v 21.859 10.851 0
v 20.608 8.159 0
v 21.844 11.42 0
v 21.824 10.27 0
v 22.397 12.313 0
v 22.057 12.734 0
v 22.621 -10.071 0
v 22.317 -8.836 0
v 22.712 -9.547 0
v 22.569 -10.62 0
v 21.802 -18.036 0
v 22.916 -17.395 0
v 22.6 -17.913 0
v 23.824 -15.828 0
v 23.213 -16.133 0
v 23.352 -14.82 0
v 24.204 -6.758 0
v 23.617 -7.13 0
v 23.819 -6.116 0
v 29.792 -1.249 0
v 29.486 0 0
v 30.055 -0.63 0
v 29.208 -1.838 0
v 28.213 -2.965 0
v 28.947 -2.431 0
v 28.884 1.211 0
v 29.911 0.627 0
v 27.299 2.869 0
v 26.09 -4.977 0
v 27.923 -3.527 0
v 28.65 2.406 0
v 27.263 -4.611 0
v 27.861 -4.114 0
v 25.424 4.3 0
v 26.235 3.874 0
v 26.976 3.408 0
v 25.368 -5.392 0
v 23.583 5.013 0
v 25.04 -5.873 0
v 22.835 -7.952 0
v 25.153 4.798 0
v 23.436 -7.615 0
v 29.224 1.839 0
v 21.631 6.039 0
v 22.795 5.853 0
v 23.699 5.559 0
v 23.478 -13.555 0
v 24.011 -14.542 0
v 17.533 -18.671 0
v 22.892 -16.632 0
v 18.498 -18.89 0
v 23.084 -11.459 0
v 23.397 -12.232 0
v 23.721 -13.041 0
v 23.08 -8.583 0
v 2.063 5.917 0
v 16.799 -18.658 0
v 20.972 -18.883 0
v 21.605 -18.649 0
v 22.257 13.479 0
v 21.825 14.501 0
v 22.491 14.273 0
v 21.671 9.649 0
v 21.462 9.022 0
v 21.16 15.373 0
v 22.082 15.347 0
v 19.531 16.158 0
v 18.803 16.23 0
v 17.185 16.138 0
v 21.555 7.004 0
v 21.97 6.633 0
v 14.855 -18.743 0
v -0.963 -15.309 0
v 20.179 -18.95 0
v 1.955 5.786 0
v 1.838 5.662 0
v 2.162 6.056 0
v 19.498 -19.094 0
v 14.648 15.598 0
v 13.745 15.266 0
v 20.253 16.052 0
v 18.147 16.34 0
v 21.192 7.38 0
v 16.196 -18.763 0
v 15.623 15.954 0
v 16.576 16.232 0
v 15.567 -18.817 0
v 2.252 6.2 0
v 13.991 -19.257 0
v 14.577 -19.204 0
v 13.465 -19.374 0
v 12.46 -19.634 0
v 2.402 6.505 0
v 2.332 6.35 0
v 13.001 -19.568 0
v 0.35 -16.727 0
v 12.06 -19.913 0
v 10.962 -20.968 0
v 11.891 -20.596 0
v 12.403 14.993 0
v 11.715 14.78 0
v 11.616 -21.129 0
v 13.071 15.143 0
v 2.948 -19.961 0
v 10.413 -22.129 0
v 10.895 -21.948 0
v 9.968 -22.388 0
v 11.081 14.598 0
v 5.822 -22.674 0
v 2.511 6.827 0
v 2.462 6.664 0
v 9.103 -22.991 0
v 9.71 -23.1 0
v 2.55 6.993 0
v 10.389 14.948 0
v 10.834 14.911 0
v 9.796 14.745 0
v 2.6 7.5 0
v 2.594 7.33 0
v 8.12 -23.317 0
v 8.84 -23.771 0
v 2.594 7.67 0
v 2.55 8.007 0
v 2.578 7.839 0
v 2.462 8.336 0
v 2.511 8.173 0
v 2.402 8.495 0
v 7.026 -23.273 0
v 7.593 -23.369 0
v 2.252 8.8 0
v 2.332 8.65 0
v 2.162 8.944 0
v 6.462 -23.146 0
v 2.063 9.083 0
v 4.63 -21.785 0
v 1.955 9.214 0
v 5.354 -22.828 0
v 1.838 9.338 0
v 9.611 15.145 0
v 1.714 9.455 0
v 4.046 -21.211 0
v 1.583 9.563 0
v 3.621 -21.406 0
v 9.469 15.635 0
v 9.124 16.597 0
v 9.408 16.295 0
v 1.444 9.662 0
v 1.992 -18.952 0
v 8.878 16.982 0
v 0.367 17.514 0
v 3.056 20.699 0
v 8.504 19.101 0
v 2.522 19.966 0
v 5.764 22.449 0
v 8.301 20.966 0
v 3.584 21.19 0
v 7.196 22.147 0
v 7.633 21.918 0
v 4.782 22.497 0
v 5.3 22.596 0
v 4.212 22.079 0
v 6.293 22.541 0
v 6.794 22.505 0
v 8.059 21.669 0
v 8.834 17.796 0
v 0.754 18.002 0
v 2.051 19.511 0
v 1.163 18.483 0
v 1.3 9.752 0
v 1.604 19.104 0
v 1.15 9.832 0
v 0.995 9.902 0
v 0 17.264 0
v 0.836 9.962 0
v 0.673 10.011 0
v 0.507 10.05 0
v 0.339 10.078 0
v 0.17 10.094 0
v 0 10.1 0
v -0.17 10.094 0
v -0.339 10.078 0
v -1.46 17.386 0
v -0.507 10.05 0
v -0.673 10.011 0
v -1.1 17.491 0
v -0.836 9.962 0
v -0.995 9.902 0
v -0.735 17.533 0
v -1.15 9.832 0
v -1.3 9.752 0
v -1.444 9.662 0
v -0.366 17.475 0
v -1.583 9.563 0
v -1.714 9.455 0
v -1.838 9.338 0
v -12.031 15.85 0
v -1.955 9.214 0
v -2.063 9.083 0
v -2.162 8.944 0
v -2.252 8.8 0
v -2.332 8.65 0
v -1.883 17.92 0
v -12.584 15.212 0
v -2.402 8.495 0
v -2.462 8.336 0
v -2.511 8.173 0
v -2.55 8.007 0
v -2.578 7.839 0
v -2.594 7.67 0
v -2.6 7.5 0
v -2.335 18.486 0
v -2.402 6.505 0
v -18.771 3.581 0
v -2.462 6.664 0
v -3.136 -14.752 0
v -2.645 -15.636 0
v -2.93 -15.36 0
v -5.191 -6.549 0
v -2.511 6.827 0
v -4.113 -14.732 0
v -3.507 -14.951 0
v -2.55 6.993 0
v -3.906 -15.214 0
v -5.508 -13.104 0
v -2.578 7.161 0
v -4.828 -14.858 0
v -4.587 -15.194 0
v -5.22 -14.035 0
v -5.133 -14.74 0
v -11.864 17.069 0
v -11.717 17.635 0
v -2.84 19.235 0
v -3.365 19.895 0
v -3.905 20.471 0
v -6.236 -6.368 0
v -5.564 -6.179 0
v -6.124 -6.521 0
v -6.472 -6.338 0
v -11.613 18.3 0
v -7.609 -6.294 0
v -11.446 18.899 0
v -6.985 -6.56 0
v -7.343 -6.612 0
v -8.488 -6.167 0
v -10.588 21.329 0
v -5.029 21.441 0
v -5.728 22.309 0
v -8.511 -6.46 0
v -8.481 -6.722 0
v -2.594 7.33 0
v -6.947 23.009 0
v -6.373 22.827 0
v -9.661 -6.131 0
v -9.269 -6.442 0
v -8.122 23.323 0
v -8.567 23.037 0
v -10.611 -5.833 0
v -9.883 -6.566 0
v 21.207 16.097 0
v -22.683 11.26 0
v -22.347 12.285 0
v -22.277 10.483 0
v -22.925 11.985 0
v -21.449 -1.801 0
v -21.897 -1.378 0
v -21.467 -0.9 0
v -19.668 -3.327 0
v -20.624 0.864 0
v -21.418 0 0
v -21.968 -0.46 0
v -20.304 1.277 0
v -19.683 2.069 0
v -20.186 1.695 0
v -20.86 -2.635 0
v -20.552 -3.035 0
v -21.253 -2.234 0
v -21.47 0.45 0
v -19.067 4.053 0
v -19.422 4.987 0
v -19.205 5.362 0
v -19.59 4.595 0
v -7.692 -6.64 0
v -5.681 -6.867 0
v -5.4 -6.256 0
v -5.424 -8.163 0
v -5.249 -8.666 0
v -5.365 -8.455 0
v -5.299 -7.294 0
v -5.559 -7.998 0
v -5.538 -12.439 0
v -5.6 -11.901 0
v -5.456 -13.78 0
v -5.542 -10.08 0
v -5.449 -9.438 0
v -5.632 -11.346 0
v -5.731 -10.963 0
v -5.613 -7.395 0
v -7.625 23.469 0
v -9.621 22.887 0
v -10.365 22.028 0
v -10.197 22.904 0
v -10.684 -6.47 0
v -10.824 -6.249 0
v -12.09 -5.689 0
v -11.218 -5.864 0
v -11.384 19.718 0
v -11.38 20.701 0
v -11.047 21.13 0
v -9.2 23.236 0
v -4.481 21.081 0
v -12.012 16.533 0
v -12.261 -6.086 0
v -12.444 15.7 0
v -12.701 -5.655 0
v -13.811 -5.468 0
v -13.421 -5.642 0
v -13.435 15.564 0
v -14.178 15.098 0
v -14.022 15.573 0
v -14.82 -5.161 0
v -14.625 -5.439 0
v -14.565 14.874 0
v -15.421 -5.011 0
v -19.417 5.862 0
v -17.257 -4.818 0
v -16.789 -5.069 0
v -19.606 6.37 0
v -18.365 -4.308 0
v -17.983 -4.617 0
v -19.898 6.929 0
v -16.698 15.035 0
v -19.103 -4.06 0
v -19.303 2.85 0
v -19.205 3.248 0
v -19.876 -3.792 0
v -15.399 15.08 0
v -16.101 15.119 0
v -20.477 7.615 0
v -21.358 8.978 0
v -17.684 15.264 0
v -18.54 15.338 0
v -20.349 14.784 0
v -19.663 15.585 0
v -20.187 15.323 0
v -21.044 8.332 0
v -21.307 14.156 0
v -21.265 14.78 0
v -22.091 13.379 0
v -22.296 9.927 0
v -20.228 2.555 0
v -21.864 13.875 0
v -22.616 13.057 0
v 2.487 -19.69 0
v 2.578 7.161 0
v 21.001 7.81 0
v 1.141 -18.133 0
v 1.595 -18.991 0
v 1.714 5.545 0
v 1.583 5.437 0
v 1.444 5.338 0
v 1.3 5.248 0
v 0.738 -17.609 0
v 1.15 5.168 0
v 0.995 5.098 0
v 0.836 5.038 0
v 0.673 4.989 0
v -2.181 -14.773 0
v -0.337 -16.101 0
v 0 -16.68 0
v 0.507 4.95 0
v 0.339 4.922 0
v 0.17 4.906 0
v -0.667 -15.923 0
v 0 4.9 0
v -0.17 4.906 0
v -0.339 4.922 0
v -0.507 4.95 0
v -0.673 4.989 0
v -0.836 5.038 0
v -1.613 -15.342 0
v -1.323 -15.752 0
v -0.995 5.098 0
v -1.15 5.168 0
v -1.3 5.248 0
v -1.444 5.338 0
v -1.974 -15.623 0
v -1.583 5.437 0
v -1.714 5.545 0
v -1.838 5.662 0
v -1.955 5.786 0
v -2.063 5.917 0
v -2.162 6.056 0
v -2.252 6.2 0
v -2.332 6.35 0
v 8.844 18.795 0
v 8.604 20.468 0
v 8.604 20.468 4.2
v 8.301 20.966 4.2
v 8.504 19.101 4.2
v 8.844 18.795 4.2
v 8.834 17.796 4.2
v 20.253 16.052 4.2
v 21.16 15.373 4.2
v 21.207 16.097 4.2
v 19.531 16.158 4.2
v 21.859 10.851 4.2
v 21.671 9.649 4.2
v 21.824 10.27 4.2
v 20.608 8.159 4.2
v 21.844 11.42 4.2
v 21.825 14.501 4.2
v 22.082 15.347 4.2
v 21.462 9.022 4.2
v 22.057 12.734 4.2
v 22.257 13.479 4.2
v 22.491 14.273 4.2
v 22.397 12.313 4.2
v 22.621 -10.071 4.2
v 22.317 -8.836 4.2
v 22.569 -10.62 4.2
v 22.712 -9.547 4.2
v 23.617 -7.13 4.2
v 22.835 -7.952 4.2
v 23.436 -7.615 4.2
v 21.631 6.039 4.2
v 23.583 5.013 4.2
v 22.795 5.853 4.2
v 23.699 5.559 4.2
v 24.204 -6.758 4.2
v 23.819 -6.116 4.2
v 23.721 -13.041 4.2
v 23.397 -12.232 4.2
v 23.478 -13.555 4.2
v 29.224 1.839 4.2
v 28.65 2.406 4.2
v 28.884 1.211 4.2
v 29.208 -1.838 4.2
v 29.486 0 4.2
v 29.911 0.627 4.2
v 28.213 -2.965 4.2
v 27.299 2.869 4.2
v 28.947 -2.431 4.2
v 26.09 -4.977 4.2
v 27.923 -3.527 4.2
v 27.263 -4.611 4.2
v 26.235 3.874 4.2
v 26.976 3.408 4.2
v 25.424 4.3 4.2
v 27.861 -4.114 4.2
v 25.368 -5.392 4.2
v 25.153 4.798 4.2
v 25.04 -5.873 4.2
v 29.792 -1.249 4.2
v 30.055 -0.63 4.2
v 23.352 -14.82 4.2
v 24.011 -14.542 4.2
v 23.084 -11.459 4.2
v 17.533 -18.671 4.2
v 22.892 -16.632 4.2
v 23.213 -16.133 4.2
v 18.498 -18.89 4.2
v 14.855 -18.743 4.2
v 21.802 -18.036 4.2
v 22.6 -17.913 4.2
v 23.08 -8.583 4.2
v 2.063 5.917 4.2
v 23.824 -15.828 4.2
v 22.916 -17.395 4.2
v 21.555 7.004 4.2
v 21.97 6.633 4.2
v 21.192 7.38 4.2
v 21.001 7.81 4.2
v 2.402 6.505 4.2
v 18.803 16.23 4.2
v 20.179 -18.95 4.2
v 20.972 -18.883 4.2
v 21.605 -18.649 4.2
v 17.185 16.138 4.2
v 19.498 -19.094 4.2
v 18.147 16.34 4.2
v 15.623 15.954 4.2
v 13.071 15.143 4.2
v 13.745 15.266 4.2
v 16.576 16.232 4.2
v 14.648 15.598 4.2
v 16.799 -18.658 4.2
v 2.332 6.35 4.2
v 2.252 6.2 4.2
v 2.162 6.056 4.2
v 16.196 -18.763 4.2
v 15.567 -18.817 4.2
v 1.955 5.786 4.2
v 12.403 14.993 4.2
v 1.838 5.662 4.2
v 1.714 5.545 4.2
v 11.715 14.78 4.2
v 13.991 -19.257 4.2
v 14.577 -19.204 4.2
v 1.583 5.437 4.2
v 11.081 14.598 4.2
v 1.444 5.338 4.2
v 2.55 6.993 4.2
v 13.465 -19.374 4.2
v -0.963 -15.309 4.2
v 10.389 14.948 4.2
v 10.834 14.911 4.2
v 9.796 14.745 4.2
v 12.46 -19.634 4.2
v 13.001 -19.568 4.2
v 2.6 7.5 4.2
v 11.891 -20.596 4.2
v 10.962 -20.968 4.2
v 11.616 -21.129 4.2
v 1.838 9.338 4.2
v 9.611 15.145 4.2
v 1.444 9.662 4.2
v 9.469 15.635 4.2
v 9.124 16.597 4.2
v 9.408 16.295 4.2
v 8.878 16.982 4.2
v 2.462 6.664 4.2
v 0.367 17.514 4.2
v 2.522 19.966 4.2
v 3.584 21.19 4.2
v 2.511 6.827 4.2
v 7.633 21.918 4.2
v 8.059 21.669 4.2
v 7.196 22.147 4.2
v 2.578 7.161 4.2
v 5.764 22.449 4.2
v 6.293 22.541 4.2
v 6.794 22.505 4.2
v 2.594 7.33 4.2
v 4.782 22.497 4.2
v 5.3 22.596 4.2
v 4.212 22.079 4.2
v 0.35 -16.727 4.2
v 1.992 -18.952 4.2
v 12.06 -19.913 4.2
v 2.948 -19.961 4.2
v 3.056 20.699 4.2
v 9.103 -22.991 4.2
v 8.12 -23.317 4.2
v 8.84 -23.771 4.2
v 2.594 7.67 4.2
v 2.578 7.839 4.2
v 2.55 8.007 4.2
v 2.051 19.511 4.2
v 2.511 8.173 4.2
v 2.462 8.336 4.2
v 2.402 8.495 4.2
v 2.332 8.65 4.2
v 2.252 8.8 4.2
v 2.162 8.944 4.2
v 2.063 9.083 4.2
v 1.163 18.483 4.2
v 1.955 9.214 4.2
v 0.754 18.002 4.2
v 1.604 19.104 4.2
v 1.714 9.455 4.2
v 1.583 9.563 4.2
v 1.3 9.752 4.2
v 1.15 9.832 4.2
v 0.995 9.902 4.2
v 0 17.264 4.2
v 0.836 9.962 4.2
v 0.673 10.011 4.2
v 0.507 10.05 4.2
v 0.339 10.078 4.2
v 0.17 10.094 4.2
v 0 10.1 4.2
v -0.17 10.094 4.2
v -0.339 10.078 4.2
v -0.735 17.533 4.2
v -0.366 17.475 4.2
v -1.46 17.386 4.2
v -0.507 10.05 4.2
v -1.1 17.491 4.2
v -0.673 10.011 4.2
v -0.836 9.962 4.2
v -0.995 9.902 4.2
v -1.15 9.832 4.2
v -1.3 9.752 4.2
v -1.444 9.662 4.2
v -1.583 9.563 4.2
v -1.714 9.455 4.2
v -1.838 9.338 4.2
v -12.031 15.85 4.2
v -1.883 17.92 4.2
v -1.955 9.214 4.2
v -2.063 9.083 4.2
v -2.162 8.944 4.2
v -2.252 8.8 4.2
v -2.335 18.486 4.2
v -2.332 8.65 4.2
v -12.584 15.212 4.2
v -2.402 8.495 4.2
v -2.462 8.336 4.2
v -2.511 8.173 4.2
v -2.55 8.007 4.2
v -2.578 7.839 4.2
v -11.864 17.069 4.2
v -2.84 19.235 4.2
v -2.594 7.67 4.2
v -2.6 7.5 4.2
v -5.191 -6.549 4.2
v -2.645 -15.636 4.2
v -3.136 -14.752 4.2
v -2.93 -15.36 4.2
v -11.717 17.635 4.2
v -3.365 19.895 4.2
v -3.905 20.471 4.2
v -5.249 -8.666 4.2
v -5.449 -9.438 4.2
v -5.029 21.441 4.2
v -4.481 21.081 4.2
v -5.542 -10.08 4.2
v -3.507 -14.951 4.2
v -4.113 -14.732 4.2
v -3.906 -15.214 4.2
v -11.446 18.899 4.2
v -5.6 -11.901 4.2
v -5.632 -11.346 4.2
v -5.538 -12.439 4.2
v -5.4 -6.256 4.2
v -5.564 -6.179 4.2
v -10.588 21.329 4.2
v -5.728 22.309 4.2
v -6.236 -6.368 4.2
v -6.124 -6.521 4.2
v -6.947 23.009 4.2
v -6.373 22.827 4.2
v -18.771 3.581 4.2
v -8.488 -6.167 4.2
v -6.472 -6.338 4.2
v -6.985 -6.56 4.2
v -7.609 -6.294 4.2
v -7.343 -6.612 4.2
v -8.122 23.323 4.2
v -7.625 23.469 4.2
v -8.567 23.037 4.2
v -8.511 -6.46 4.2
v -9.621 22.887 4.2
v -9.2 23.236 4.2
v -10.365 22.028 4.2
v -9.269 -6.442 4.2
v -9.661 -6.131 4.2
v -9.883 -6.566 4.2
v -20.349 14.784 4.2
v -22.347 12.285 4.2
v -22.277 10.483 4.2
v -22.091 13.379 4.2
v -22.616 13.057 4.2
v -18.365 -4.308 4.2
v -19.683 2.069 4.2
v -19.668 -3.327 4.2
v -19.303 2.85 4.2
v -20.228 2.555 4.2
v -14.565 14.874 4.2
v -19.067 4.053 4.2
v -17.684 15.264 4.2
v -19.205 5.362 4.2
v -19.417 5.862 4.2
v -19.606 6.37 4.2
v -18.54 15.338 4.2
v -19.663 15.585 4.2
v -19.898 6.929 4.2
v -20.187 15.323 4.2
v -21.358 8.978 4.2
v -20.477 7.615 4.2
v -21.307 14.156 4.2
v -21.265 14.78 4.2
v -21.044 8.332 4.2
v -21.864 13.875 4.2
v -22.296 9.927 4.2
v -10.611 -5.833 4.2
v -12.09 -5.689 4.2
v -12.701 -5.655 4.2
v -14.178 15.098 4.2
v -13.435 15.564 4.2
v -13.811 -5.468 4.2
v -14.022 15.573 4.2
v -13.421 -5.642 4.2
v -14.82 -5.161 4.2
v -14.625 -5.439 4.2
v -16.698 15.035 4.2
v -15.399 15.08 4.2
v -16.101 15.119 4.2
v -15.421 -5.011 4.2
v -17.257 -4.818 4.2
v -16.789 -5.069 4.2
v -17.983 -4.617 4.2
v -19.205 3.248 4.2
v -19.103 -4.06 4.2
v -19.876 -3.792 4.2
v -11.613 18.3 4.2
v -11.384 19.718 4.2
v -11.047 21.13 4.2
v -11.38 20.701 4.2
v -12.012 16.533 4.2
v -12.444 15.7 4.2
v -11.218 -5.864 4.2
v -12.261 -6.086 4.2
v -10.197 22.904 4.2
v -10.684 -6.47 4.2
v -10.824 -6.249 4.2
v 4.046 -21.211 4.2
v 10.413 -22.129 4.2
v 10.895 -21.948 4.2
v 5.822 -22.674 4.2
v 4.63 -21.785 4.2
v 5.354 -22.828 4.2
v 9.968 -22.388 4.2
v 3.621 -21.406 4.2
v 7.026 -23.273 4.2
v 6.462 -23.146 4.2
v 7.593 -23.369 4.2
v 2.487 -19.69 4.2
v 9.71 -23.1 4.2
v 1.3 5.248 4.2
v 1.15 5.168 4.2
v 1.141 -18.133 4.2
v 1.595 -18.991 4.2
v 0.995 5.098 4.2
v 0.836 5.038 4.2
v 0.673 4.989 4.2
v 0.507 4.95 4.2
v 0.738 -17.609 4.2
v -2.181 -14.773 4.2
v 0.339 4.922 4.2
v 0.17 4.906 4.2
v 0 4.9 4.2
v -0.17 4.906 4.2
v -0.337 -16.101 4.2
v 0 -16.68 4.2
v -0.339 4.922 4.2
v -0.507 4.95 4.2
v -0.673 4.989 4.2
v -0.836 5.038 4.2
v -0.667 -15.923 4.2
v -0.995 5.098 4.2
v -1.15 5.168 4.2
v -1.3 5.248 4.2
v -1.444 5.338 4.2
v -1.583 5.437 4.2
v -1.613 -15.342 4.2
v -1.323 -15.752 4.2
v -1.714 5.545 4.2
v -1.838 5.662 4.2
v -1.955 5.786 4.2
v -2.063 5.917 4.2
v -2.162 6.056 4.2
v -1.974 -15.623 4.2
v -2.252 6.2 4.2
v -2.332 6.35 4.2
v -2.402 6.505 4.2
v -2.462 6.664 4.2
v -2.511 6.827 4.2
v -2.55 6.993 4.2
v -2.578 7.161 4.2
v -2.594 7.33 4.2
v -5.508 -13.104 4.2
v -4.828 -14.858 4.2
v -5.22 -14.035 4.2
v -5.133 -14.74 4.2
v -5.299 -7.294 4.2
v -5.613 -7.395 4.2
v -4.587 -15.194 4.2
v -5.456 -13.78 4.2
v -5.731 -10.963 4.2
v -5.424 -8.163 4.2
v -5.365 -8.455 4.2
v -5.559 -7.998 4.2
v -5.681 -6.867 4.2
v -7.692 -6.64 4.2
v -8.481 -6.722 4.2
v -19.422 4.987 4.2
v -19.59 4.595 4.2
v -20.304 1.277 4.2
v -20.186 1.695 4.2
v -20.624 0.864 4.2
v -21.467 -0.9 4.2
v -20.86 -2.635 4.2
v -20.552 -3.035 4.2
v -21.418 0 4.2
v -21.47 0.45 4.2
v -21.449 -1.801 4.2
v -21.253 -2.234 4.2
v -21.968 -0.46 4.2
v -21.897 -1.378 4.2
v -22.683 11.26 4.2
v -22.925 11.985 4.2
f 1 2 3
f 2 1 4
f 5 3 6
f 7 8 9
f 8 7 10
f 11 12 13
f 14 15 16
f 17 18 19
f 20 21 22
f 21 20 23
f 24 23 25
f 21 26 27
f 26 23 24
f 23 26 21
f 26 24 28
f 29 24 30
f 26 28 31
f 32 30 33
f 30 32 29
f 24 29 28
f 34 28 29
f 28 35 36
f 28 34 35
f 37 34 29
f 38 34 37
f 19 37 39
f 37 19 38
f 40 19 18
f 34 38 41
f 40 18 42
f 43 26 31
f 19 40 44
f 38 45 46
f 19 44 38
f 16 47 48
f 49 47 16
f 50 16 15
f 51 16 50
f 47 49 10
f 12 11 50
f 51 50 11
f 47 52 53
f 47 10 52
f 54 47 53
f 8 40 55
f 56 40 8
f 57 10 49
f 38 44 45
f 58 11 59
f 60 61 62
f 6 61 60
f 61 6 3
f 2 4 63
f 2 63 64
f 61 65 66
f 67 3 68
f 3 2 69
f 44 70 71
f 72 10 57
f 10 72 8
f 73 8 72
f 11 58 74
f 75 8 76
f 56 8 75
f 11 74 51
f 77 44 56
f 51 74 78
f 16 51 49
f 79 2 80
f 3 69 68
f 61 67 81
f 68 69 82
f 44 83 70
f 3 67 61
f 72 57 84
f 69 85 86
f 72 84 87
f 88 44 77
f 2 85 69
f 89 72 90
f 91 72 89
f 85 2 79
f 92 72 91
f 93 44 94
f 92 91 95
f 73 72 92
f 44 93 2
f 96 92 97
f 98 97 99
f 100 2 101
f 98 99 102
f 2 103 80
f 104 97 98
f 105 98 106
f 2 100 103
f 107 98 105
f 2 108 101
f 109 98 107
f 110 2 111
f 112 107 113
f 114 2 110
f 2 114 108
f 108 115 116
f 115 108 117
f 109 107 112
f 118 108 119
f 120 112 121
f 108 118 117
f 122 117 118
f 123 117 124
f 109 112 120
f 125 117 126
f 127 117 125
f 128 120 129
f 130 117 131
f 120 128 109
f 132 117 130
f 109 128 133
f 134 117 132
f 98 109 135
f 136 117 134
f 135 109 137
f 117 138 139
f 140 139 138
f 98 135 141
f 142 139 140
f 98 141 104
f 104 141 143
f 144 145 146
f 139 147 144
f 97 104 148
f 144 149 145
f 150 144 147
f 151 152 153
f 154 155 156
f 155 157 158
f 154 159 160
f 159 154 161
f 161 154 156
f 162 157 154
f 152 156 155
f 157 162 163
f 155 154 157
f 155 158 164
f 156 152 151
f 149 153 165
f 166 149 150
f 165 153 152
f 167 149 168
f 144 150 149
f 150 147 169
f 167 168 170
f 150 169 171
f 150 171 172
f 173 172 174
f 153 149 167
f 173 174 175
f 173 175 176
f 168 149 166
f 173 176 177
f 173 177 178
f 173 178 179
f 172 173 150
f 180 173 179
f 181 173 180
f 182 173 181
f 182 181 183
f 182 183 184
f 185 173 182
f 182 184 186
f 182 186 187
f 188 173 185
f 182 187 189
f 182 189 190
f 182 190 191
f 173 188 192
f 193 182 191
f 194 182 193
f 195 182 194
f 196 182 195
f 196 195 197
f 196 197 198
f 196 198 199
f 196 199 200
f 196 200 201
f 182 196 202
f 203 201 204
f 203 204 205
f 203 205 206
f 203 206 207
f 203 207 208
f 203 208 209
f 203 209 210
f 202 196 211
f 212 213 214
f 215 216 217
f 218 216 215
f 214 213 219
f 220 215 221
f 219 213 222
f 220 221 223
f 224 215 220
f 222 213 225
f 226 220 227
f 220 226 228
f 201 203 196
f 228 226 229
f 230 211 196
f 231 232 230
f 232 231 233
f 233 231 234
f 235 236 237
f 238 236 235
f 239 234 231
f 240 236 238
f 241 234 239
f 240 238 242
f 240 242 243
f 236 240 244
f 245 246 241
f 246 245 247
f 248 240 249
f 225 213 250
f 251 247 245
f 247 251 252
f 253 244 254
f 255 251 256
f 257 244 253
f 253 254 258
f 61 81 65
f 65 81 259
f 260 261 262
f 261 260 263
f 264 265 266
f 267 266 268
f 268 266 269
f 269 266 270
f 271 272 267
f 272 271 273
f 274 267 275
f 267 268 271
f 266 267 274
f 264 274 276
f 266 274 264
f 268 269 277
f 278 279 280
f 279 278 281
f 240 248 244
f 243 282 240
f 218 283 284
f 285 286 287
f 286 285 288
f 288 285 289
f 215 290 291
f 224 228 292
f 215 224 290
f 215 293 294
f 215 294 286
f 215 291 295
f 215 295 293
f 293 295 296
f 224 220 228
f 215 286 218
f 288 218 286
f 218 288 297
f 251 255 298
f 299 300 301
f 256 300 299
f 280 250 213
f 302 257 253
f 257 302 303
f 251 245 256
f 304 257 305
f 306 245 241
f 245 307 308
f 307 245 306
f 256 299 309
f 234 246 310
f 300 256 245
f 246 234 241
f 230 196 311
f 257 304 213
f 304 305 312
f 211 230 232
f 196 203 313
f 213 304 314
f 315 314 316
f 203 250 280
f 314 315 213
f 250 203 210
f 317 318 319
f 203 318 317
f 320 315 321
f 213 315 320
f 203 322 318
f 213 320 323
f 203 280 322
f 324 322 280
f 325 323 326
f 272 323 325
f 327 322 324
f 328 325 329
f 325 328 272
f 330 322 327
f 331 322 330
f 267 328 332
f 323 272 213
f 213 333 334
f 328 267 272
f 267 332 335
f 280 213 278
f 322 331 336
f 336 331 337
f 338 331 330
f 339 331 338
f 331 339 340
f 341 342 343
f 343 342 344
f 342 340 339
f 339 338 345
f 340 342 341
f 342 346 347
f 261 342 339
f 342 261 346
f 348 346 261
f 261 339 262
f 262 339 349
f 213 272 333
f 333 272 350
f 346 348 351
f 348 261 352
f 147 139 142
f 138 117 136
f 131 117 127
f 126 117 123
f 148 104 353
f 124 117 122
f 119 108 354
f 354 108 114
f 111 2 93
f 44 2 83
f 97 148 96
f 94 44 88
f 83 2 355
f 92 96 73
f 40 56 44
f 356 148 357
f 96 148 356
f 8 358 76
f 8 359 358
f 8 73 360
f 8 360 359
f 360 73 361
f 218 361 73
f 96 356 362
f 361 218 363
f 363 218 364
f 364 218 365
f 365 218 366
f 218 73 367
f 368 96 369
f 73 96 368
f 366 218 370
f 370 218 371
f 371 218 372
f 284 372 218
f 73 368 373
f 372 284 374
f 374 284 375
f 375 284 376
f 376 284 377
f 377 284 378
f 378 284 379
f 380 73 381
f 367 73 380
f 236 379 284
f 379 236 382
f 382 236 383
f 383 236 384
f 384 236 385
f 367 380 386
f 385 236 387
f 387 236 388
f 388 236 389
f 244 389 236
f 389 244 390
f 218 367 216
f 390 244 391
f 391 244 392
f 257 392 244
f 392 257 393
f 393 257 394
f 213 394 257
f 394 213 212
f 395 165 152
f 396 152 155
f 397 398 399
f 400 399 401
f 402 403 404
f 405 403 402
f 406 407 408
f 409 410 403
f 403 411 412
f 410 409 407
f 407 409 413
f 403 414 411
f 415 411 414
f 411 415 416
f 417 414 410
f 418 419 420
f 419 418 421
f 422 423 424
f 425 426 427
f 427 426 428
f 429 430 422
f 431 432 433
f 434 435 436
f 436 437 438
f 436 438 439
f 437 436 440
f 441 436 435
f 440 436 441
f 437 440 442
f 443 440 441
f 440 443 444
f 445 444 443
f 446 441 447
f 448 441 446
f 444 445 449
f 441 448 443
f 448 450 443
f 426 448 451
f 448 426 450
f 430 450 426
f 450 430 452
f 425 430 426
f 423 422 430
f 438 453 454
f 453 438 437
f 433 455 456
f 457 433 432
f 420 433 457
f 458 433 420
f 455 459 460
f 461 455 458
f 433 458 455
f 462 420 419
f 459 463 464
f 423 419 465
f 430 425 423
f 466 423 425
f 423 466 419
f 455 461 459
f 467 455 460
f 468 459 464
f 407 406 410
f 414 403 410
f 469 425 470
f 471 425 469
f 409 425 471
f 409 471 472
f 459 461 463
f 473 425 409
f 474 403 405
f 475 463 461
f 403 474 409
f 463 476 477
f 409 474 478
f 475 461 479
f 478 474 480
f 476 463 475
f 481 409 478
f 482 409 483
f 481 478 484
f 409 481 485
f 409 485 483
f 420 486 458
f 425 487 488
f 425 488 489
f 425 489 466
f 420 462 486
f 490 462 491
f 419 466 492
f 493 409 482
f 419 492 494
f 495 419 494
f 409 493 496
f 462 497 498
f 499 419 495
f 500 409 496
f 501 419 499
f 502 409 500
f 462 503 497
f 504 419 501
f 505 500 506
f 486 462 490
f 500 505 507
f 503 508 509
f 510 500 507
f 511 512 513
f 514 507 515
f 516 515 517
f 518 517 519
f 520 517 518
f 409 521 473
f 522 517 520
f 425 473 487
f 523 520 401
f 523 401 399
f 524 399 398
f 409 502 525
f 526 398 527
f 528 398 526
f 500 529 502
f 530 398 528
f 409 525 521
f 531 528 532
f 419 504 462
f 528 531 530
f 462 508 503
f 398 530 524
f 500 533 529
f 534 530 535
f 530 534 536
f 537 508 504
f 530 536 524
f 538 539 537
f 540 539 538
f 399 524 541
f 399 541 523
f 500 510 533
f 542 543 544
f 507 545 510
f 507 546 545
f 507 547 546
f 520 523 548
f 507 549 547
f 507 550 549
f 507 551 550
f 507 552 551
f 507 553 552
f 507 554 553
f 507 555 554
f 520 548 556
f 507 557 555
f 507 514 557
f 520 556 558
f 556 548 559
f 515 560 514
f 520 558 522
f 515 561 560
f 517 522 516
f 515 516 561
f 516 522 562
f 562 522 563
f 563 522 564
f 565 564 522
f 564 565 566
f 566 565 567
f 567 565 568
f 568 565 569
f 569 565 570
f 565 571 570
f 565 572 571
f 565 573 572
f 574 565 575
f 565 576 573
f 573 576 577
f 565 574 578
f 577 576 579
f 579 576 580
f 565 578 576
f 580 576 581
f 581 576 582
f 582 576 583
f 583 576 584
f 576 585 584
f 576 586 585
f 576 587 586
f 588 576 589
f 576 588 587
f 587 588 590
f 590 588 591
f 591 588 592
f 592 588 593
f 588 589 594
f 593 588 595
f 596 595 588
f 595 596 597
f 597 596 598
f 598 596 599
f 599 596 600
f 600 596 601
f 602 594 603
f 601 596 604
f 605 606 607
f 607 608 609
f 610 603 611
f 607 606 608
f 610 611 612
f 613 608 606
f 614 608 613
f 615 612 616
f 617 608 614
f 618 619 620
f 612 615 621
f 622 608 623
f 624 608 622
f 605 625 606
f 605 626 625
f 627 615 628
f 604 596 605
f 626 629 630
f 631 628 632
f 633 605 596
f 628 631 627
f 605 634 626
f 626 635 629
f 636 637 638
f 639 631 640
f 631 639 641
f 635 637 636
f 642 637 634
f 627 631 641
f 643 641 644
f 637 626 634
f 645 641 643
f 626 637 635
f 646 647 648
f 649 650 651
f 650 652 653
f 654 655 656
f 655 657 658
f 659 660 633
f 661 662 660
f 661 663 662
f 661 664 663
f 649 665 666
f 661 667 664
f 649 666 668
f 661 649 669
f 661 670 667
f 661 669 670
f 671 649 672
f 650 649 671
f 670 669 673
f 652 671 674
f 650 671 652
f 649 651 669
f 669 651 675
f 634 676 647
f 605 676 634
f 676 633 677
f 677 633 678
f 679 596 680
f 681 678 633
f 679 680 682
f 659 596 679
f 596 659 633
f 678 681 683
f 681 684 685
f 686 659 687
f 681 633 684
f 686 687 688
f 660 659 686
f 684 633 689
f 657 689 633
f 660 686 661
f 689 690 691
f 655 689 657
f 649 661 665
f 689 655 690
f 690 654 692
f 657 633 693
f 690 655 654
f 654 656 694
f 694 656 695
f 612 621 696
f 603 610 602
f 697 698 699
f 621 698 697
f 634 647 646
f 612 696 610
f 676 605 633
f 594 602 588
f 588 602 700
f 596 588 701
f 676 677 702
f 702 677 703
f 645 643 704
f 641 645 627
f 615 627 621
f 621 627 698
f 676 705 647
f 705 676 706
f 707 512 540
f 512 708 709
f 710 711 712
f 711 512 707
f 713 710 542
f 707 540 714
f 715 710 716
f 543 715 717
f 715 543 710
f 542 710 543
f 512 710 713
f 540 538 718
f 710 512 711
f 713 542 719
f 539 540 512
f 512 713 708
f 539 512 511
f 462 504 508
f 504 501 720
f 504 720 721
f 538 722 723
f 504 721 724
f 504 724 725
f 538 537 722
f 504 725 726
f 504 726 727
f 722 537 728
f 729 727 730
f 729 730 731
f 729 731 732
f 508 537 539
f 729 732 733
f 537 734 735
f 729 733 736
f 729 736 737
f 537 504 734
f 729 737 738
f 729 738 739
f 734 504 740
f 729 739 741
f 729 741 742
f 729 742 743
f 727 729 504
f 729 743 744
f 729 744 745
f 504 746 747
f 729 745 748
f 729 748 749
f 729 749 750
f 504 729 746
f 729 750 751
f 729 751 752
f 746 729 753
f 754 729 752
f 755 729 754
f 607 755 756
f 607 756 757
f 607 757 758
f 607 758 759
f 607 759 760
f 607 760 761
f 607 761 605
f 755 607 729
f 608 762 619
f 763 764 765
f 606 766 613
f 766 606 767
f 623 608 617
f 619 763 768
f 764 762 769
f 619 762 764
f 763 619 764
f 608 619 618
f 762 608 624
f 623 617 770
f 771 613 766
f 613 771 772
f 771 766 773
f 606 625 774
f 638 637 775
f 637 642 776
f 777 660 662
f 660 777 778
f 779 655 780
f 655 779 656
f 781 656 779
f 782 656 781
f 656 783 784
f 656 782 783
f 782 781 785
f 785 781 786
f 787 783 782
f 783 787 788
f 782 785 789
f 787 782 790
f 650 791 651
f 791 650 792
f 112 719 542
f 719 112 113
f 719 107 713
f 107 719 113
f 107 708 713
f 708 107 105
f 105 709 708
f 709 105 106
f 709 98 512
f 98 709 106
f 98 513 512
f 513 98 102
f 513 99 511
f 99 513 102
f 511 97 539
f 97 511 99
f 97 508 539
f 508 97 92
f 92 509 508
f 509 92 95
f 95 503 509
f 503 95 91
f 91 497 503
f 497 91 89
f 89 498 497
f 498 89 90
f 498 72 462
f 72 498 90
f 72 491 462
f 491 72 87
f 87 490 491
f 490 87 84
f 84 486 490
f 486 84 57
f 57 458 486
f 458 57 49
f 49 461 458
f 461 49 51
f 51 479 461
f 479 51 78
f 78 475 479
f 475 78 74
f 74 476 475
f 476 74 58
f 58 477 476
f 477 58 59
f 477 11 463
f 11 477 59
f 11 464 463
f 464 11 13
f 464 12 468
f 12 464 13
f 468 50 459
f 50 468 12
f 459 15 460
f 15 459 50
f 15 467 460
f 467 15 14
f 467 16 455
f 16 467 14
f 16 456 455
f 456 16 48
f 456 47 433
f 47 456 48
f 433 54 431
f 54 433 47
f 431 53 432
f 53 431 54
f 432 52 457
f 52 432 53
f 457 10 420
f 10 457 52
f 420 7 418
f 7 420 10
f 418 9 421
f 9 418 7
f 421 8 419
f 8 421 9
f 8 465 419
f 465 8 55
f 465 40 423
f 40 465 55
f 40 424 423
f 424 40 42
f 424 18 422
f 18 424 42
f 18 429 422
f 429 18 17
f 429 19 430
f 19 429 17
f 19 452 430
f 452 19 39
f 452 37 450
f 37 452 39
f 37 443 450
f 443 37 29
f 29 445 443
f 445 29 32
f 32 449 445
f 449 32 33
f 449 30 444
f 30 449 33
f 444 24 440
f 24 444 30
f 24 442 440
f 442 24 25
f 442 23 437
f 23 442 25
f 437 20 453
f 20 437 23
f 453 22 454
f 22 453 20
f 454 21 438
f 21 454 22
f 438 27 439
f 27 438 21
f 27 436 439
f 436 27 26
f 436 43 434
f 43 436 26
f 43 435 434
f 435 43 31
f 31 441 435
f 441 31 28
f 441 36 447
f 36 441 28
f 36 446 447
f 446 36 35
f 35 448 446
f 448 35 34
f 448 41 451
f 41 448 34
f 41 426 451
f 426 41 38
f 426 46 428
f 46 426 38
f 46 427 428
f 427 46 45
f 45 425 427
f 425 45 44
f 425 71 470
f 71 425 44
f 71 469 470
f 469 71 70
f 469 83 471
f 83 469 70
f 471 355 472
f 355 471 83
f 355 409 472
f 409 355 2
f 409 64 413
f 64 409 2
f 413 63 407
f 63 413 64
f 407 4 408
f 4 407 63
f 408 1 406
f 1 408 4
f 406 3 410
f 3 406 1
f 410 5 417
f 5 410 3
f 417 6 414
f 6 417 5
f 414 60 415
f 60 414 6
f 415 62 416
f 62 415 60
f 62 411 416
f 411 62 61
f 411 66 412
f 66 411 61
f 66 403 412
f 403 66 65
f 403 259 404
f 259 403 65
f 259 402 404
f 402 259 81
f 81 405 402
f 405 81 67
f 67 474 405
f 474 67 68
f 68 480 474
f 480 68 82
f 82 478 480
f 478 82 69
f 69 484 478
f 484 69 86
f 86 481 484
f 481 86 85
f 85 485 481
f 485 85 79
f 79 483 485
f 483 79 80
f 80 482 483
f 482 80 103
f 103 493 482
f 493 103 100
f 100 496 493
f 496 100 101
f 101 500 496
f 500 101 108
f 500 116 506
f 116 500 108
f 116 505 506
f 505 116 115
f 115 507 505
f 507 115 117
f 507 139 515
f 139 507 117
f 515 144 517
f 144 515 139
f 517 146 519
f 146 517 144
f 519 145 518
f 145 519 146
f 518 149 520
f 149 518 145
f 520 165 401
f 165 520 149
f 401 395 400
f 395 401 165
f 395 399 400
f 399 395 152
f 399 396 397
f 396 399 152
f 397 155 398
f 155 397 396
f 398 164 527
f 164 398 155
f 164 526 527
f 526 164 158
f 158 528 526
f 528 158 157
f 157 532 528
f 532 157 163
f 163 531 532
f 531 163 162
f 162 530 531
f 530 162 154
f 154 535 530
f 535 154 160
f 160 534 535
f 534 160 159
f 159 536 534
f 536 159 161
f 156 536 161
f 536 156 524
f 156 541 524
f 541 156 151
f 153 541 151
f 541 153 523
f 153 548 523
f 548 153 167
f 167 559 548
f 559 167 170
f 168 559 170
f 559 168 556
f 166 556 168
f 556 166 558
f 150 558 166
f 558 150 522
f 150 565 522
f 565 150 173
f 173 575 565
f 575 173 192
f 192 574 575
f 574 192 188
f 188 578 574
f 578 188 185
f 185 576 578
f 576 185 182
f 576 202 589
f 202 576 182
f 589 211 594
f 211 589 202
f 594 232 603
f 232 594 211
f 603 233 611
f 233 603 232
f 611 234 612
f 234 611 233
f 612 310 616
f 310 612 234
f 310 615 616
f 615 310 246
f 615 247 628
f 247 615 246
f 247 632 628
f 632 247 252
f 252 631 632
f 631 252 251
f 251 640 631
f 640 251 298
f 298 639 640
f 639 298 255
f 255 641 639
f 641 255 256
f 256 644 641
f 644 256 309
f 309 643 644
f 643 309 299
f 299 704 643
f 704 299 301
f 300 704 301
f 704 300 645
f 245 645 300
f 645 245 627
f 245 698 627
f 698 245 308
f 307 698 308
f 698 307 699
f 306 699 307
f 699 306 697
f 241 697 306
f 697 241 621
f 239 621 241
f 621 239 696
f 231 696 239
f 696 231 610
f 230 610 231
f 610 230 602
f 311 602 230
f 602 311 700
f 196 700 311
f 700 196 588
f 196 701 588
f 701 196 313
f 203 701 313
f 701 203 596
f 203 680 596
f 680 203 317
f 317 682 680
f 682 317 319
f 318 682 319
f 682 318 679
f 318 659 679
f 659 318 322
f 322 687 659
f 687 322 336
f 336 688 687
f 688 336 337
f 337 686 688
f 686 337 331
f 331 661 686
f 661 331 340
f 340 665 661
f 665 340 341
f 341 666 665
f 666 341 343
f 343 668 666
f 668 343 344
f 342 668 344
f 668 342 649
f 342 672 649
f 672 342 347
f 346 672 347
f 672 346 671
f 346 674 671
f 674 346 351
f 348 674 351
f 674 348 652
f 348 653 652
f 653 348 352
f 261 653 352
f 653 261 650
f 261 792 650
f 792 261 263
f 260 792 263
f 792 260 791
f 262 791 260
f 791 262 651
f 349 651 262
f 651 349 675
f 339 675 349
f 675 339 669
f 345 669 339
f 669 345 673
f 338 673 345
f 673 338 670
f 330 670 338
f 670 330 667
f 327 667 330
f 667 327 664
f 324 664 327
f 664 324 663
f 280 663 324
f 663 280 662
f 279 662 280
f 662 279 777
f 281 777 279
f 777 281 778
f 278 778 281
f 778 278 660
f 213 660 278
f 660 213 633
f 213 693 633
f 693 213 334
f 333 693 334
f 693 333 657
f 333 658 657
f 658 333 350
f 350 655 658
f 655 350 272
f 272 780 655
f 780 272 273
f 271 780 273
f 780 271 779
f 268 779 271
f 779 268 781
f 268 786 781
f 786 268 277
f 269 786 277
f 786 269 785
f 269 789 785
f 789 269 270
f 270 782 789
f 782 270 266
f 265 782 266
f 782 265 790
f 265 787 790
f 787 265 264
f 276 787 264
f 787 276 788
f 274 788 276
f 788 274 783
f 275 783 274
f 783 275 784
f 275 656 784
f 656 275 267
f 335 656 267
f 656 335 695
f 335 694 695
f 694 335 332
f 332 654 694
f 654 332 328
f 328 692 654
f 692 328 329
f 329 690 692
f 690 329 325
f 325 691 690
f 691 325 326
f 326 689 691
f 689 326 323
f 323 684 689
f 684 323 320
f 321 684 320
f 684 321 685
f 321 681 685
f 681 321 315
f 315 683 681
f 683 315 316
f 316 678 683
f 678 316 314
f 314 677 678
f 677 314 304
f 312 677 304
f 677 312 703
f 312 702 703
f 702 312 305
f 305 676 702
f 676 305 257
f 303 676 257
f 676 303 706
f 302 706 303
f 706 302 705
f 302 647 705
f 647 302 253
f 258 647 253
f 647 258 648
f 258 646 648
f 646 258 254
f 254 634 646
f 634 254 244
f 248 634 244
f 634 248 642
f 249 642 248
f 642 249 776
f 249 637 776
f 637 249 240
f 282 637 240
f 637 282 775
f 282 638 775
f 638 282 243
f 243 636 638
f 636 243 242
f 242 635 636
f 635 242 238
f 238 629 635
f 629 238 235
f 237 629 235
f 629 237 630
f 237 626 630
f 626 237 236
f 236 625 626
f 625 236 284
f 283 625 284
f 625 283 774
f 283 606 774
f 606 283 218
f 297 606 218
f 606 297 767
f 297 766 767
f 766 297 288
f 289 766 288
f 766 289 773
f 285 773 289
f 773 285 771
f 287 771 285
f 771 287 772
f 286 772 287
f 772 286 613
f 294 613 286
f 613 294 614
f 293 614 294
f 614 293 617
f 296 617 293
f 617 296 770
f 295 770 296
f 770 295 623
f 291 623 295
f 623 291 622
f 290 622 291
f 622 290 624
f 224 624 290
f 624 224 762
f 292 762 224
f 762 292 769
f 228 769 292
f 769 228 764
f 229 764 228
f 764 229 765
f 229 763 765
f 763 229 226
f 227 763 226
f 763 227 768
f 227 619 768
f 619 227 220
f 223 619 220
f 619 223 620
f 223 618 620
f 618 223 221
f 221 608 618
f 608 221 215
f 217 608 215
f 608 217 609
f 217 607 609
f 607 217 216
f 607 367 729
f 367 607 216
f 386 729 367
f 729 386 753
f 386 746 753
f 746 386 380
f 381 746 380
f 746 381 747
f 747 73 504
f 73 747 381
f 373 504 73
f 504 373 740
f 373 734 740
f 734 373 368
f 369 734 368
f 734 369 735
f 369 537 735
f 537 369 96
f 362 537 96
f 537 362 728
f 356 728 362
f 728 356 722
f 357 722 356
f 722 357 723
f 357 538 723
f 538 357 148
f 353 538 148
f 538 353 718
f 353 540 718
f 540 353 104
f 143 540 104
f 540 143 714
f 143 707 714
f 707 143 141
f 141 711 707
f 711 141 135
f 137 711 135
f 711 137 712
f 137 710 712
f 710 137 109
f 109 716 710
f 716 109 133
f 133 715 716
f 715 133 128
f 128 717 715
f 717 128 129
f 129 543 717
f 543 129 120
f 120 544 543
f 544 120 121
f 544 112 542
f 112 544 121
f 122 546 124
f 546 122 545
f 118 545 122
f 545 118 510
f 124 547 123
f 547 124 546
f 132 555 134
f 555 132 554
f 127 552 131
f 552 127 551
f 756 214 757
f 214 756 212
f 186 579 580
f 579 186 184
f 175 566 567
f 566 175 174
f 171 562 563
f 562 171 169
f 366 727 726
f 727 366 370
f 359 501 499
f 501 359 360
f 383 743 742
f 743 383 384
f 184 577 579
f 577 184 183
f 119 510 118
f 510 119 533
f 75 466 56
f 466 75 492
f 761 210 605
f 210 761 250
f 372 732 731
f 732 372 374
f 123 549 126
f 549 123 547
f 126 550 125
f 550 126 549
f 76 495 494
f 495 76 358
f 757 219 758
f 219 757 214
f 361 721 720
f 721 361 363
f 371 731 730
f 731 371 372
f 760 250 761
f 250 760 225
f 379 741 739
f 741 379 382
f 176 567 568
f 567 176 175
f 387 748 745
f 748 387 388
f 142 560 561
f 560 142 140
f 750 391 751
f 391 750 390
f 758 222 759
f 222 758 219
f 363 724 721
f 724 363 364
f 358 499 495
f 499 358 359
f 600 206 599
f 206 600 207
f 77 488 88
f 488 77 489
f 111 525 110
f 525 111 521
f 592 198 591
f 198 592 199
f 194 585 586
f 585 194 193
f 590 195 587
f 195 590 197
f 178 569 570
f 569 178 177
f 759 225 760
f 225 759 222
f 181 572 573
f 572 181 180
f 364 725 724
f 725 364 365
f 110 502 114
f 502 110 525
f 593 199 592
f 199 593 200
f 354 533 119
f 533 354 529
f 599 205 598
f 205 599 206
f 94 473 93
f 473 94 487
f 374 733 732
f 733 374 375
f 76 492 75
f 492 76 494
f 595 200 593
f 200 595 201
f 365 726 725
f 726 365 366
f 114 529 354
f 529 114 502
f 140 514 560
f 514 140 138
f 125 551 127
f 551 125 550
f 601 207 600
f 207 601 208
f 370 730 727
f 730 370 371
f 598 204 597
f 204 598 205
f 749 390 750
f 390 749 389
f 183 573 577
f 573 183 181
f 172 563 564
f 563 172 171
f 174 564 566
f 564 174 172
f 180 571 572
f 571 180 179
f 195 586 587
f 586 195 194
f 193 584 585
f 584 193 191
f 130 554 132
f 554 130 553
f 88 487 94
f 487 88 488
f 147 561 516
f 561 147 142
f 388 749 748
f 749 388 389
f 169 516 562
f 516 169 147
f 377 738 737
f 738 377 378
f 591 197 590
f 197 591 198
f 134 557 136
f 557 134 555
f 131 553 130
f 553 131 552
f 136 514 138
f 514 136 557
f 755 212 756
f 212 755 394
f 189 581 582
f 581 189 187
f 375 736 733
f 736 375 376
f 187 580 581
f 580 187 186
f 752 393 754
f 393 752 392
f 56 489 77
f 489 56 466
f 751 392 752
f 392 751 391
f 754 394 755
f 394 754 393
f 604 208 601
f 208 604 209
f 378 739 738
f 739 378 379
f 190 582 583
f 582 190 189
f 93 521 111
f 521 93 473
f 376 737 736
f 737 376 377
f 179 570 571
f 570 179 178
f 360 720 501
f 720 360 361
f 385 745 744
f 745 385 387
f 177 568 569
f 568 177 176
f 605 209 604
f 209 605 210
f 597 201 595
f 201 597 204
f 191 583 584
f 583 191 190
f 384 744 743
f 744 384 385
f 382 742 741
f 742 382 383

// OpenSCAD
$fn=96;
thickness_mm = 4.2;
pts = [[29.4864, 0.0], [29.9114, 0.6266], [28.8839, 1.2106], [29.2239, 1.8386], [28.6503, 2.4058], [27.2988, 2.8692], [26.9763, 3.4079], [26.2348, 3.874], [25.4244, 4.3002], [25.1534, 4.7983], [23.5828, 5.0127], [23.6991, 5.5586], [22.7947, 5.8527], [21.631, 6.0395], [21.9701, 6.6332], [21.5547, 7.0036], [21.1917, 7.3797], [21.0009, 7.8102], [20.6078, 8.1592], [21.4625, 9.022], [21.6715, 9.6488], [21.8245, 10.2698], [21.8589, 10.8509], [21.8444, 11.42], [22.3975, 12.3131], [22.0567, 12.7345], [22.2568, 13.4792], [22.4915, 14.2735], [21.8254, 14.5008], [22.0817, 15.3472], [21.1598, 15.3735], [21.2068, 16.0969], [20.2529, 16.0523], [19.5315, 16.1579], [18.803, 16.2303], [18.1472, 16.3398], [17.1854, 16.1382], [16.5757, 16.2321], [15.623, 15.9537], [14.6477, 15.5982], [13.7455, 15.266], [13.0713, 15.1432], [12.4033, 14.9931], [11.7149, 14.7805], [11.0806, 14.5982], [10.8337, 14.9113], [10.3892, 14.9481], [9.7963, 14.7447], [9.6111, 15.1447], [9.4691, 15.6354], [9.4079, 16.295], [9.1244, 16.5973], [8.8778, 16.9817], [8.8338, 17.7956], [8.8443, 18.795], [8.5044, 19.1013], [8.6038, 20.4677], [8.3012, 20.9664], [8.0588, 21.6694], [7.6327, 21.9181], [7.1961, 22.1474], [6.7945, 22.5046], [6.2935, 22.5408], [5.7639, 22.4489], [5.2999, 22.5963], [4.7819, 22.497], [4.2118, 22.079], [3.5841, 21.1905], [3.0565, 20.6986], [2.5222, 19.9656], [2.0507, 19.5107], [1.6042, 19.1039], [1.1629, 18.483], [0.7545, 18.0025], [0.3669, 17.5143], [0.0, 17.2639], [-0.3661, 17.4753], [-0.7348, 17.5329], [-1.1005, 17.4915], [-1.46, 17.3864], [-1.8835, 17.92], [-2.3354, 18.4863], [-2.8404, 19.2352], [-3.3649, 19.8946], [-3.905, 20.4709], [-4.481, 21.0813], [-5.0289, 21.4408], [-5.7279, 22.3086], [-6.3734, 22.827], [-6.9468, 23.0088], [-7.6254, 23.4687], [-8.1221, 23.3234], [-8.5674, 23.037], [-9.1997, 23.2359], [-9.6207, 22.8868], [-10.1974, 22.9037], [-10.3654, 22.0277], [-10.5876, 21.3287], [-11.0466, 21.1302], [-11.3804, 20.7008], [-11.3842, 19.718], [-11.4456, 18.8989], [-11.6133, 18.2996], [-11.7167, 17.635], [-11.8636, 17.0695], [-12.0119, 16.5329], [-12.031, 15.8502], [-12.4436, 15.6999], [-12.5845, 15.212], [-13.4349, 15.5645], [-14.0218, 15.5728], [-14.1783, 15.0984], [-14.5654, 14.8737], [-15.3994, 15.0802], [-16.1007, 15.1195], [-16.6983, 15.0352], [-17.6839, 15.2643], [-18.5404, 15.338], [-19.6631, 15.5848], [-20.1873, 15.323], [-20.3492, 14.7845], [-21.2651, 14.7796], [-21.3066, 14.156], [-21.8638, 13.8752], [-22.0915, 13.3791], [-22.6161, 13.0574], [-22.3471, 12.2854], [-22.9248, 11.9848], [-22.6829, 11.2599], [-22.2769, 10.4827], [-22.2965, 9.9271], [-21.3585, 8.9783], [-21.0438, 8.3318], [-20.4768, 7.6152], [-19.8985, 6.9294], [-19.606, 6.3704], [-19.4175, 5.8625], [-19.2055, 5.3623], [-19.4216, 4.9866], [-19.5904, 4.5949], [-19.0668, 4.0528], [-18.7712, 3.5808], [-19.2052, 3.2483], [-19.303, 2.8504], [-20.2278, 2.5554], [-19.6826, 2.0687], [-20.1864, 1.6951], [-20.3042, 1.2774], [-20.6238, 0.8644], [-21.4698, 0.4497], [-21.4183, 0.0], [-21.968, -0.4602], [-21.4673, -0.8997], [-21.8966, -1.3776], [-21.4488, -1.8011], [-21.253, -2.2338], [-20.86, -2.6352], [-20.5522, -3.0349], [-19.6678, -3.3266], [-19.876, -3.7916], [-19.103, -4.0605], [-18.3653, -4.3076], [-17.9829, -4.6172], [-17.2566, -4.8181], [-16.7894, -5.069], [-15.421, -5.0106], [-14.8204, -5.161], [-14.6254, -5.4391], [-13.8111, -5.4682], [-13.4211, -5.6417], [-12.7007, -5.6547], [-12.0904, -5.6893], [-12.2607, -6.0862], [-11.2177, -5.8645], [-10.6107, -5.8333], [-10.8241, -6.2493], [-10.6836, -6.4702], [-9.661, -6.1311], [-9.8827, -6.5661], [-9.2692, -6.4423], [-8.4885, -6.1673], [-8.5111, -6.4603], [-8.4813, -6.7222], [-7.6087, -6.2945], [-7.692, -6.6396], [-7.3435, -6.6122], [-6.9855, -6.5598], [-6.4721, -6.338], [-6.2359, -6.3679], [-6.124, -6.5214], [-5.5639, -6.1794], [-5.3999, -6.2559], [-5.6806, -6.8666], [-5.191, -6.5494], [-5.6131, -7.395], [-5.2993, -7.2938], [-5.559, -7.9984], [-5.4238, -8.1634], [-5.3655, -8.4547], [-5.2486, -8.6664], [-5.4488, -9.4376], [-5.5416, -10.0801], [-5.7313, -10.963], [-5.6323, -11.3462], [-5.6002, -11.9009], [-5.538, -12.4386], [-5.5085, -13.1041], [-5.4561, -13.7805], [-5.2197, -14.0352], [-5.1331, -14.7404], [-4.8277, -14.8583], [-4.5873, -15.194], [-4.1132, -14.7319], [-3.9063, -15.2141], [-3.5067, -14.9511], [-3.1356, -14.7521], [-2.93, -15.3597], [-2.6446, -15.6361], [-2.1815, -14.7731], [-1.9737, -15.6235], [-1.6126, -15.3425], [-1.3228, -15.7523], [-0.9632, -15.3089], [-0.6674, -15.9233], [-0.3373, -16.1014], [-0.0, -16.6798], [0.3504, -16.7268], [0.738, -17.6086], [1.1408, -18.1332], [1.5948, -18.9915], [1.992, -18.9524], [2.4874, -19.69], [2.9476, -19.9614], [3.6206, -21.4062], [4.0462, -21.2107], [4.6305, -21.7848], [5.3543, -22.8281], [5.8217, -22.6742], [6.4625, -23.1461], [7.0264, -23.2726], [7.5932, -23.3693], [8.1199, -23.3173], [8.8405, -23.7715], [9.1028, -22.991], [9.7104, -23.1002], [9.9678, -22.388], [10.4131, -22.129], [10.895, -21.9478], [10.9618, -20.9681], [11.6159, -21.1293], [11.8913, -20.5963], [12.0599, -19.9133], [12.4599, -19.6337], [13.0011, -19.5682], [13.4652, -19.3739], [13.9912, -19.2573], [14.5768, -19.2042], [14.8554, -18.7428], [15.5668, -18.817], [16.1959, -18.7631], [16.7994, -18.6576], [17.5331, -18.6709], [18.4984, -18.89], [19.4984, -19.0942], [20.1795, -18.9498], [20.972, -18.8833], [21.605, -18.6489], [21.8024, -18.0365], [22.6004, -17.9129], [22.9165, -17.3946], [22.8919, -16.6319], [23.2126, -16.1332], [23.8237, -15.8285], [23.3523, -14.8198], [24.011, -14.5416], [23.4778, -13.5549], [23.7211, -13.0408], [23.397, -12.2317], [23.0841, -11.459], [22.5691, -10.6202], [22.621, -10.0715], [22.7116, -9.5471], [22.3172, -8.836], [23.0796, -8.5832], [22.8346, -7.9518], [23.4357, -7.6147], [23.6169, -7.1304], [24.2044, -6.758], [23.8191, -6.1157], [25.0396, -5.873], [25.3683, -5.3922], [26.0904, -4.977], [27.2632, -4.6112], [27.8614, -4.1142], [27.9226, -3.5274], [28.2127, -2.9653], [28.9469, -2.4307], [29.2077, -1.8376], [29.7923, -1.2487], [30.0546, -0.6296]];
hole = [0.0, 7.5, 2.6];
module body(){
  linear_extrude(height=thickness_mm) polygon(points=pts);
}
difference(){
  body();
  translate([hole[0], hole[1], -1]) cylinder(h=thickness_mm+2, r=hole[2]);
}
